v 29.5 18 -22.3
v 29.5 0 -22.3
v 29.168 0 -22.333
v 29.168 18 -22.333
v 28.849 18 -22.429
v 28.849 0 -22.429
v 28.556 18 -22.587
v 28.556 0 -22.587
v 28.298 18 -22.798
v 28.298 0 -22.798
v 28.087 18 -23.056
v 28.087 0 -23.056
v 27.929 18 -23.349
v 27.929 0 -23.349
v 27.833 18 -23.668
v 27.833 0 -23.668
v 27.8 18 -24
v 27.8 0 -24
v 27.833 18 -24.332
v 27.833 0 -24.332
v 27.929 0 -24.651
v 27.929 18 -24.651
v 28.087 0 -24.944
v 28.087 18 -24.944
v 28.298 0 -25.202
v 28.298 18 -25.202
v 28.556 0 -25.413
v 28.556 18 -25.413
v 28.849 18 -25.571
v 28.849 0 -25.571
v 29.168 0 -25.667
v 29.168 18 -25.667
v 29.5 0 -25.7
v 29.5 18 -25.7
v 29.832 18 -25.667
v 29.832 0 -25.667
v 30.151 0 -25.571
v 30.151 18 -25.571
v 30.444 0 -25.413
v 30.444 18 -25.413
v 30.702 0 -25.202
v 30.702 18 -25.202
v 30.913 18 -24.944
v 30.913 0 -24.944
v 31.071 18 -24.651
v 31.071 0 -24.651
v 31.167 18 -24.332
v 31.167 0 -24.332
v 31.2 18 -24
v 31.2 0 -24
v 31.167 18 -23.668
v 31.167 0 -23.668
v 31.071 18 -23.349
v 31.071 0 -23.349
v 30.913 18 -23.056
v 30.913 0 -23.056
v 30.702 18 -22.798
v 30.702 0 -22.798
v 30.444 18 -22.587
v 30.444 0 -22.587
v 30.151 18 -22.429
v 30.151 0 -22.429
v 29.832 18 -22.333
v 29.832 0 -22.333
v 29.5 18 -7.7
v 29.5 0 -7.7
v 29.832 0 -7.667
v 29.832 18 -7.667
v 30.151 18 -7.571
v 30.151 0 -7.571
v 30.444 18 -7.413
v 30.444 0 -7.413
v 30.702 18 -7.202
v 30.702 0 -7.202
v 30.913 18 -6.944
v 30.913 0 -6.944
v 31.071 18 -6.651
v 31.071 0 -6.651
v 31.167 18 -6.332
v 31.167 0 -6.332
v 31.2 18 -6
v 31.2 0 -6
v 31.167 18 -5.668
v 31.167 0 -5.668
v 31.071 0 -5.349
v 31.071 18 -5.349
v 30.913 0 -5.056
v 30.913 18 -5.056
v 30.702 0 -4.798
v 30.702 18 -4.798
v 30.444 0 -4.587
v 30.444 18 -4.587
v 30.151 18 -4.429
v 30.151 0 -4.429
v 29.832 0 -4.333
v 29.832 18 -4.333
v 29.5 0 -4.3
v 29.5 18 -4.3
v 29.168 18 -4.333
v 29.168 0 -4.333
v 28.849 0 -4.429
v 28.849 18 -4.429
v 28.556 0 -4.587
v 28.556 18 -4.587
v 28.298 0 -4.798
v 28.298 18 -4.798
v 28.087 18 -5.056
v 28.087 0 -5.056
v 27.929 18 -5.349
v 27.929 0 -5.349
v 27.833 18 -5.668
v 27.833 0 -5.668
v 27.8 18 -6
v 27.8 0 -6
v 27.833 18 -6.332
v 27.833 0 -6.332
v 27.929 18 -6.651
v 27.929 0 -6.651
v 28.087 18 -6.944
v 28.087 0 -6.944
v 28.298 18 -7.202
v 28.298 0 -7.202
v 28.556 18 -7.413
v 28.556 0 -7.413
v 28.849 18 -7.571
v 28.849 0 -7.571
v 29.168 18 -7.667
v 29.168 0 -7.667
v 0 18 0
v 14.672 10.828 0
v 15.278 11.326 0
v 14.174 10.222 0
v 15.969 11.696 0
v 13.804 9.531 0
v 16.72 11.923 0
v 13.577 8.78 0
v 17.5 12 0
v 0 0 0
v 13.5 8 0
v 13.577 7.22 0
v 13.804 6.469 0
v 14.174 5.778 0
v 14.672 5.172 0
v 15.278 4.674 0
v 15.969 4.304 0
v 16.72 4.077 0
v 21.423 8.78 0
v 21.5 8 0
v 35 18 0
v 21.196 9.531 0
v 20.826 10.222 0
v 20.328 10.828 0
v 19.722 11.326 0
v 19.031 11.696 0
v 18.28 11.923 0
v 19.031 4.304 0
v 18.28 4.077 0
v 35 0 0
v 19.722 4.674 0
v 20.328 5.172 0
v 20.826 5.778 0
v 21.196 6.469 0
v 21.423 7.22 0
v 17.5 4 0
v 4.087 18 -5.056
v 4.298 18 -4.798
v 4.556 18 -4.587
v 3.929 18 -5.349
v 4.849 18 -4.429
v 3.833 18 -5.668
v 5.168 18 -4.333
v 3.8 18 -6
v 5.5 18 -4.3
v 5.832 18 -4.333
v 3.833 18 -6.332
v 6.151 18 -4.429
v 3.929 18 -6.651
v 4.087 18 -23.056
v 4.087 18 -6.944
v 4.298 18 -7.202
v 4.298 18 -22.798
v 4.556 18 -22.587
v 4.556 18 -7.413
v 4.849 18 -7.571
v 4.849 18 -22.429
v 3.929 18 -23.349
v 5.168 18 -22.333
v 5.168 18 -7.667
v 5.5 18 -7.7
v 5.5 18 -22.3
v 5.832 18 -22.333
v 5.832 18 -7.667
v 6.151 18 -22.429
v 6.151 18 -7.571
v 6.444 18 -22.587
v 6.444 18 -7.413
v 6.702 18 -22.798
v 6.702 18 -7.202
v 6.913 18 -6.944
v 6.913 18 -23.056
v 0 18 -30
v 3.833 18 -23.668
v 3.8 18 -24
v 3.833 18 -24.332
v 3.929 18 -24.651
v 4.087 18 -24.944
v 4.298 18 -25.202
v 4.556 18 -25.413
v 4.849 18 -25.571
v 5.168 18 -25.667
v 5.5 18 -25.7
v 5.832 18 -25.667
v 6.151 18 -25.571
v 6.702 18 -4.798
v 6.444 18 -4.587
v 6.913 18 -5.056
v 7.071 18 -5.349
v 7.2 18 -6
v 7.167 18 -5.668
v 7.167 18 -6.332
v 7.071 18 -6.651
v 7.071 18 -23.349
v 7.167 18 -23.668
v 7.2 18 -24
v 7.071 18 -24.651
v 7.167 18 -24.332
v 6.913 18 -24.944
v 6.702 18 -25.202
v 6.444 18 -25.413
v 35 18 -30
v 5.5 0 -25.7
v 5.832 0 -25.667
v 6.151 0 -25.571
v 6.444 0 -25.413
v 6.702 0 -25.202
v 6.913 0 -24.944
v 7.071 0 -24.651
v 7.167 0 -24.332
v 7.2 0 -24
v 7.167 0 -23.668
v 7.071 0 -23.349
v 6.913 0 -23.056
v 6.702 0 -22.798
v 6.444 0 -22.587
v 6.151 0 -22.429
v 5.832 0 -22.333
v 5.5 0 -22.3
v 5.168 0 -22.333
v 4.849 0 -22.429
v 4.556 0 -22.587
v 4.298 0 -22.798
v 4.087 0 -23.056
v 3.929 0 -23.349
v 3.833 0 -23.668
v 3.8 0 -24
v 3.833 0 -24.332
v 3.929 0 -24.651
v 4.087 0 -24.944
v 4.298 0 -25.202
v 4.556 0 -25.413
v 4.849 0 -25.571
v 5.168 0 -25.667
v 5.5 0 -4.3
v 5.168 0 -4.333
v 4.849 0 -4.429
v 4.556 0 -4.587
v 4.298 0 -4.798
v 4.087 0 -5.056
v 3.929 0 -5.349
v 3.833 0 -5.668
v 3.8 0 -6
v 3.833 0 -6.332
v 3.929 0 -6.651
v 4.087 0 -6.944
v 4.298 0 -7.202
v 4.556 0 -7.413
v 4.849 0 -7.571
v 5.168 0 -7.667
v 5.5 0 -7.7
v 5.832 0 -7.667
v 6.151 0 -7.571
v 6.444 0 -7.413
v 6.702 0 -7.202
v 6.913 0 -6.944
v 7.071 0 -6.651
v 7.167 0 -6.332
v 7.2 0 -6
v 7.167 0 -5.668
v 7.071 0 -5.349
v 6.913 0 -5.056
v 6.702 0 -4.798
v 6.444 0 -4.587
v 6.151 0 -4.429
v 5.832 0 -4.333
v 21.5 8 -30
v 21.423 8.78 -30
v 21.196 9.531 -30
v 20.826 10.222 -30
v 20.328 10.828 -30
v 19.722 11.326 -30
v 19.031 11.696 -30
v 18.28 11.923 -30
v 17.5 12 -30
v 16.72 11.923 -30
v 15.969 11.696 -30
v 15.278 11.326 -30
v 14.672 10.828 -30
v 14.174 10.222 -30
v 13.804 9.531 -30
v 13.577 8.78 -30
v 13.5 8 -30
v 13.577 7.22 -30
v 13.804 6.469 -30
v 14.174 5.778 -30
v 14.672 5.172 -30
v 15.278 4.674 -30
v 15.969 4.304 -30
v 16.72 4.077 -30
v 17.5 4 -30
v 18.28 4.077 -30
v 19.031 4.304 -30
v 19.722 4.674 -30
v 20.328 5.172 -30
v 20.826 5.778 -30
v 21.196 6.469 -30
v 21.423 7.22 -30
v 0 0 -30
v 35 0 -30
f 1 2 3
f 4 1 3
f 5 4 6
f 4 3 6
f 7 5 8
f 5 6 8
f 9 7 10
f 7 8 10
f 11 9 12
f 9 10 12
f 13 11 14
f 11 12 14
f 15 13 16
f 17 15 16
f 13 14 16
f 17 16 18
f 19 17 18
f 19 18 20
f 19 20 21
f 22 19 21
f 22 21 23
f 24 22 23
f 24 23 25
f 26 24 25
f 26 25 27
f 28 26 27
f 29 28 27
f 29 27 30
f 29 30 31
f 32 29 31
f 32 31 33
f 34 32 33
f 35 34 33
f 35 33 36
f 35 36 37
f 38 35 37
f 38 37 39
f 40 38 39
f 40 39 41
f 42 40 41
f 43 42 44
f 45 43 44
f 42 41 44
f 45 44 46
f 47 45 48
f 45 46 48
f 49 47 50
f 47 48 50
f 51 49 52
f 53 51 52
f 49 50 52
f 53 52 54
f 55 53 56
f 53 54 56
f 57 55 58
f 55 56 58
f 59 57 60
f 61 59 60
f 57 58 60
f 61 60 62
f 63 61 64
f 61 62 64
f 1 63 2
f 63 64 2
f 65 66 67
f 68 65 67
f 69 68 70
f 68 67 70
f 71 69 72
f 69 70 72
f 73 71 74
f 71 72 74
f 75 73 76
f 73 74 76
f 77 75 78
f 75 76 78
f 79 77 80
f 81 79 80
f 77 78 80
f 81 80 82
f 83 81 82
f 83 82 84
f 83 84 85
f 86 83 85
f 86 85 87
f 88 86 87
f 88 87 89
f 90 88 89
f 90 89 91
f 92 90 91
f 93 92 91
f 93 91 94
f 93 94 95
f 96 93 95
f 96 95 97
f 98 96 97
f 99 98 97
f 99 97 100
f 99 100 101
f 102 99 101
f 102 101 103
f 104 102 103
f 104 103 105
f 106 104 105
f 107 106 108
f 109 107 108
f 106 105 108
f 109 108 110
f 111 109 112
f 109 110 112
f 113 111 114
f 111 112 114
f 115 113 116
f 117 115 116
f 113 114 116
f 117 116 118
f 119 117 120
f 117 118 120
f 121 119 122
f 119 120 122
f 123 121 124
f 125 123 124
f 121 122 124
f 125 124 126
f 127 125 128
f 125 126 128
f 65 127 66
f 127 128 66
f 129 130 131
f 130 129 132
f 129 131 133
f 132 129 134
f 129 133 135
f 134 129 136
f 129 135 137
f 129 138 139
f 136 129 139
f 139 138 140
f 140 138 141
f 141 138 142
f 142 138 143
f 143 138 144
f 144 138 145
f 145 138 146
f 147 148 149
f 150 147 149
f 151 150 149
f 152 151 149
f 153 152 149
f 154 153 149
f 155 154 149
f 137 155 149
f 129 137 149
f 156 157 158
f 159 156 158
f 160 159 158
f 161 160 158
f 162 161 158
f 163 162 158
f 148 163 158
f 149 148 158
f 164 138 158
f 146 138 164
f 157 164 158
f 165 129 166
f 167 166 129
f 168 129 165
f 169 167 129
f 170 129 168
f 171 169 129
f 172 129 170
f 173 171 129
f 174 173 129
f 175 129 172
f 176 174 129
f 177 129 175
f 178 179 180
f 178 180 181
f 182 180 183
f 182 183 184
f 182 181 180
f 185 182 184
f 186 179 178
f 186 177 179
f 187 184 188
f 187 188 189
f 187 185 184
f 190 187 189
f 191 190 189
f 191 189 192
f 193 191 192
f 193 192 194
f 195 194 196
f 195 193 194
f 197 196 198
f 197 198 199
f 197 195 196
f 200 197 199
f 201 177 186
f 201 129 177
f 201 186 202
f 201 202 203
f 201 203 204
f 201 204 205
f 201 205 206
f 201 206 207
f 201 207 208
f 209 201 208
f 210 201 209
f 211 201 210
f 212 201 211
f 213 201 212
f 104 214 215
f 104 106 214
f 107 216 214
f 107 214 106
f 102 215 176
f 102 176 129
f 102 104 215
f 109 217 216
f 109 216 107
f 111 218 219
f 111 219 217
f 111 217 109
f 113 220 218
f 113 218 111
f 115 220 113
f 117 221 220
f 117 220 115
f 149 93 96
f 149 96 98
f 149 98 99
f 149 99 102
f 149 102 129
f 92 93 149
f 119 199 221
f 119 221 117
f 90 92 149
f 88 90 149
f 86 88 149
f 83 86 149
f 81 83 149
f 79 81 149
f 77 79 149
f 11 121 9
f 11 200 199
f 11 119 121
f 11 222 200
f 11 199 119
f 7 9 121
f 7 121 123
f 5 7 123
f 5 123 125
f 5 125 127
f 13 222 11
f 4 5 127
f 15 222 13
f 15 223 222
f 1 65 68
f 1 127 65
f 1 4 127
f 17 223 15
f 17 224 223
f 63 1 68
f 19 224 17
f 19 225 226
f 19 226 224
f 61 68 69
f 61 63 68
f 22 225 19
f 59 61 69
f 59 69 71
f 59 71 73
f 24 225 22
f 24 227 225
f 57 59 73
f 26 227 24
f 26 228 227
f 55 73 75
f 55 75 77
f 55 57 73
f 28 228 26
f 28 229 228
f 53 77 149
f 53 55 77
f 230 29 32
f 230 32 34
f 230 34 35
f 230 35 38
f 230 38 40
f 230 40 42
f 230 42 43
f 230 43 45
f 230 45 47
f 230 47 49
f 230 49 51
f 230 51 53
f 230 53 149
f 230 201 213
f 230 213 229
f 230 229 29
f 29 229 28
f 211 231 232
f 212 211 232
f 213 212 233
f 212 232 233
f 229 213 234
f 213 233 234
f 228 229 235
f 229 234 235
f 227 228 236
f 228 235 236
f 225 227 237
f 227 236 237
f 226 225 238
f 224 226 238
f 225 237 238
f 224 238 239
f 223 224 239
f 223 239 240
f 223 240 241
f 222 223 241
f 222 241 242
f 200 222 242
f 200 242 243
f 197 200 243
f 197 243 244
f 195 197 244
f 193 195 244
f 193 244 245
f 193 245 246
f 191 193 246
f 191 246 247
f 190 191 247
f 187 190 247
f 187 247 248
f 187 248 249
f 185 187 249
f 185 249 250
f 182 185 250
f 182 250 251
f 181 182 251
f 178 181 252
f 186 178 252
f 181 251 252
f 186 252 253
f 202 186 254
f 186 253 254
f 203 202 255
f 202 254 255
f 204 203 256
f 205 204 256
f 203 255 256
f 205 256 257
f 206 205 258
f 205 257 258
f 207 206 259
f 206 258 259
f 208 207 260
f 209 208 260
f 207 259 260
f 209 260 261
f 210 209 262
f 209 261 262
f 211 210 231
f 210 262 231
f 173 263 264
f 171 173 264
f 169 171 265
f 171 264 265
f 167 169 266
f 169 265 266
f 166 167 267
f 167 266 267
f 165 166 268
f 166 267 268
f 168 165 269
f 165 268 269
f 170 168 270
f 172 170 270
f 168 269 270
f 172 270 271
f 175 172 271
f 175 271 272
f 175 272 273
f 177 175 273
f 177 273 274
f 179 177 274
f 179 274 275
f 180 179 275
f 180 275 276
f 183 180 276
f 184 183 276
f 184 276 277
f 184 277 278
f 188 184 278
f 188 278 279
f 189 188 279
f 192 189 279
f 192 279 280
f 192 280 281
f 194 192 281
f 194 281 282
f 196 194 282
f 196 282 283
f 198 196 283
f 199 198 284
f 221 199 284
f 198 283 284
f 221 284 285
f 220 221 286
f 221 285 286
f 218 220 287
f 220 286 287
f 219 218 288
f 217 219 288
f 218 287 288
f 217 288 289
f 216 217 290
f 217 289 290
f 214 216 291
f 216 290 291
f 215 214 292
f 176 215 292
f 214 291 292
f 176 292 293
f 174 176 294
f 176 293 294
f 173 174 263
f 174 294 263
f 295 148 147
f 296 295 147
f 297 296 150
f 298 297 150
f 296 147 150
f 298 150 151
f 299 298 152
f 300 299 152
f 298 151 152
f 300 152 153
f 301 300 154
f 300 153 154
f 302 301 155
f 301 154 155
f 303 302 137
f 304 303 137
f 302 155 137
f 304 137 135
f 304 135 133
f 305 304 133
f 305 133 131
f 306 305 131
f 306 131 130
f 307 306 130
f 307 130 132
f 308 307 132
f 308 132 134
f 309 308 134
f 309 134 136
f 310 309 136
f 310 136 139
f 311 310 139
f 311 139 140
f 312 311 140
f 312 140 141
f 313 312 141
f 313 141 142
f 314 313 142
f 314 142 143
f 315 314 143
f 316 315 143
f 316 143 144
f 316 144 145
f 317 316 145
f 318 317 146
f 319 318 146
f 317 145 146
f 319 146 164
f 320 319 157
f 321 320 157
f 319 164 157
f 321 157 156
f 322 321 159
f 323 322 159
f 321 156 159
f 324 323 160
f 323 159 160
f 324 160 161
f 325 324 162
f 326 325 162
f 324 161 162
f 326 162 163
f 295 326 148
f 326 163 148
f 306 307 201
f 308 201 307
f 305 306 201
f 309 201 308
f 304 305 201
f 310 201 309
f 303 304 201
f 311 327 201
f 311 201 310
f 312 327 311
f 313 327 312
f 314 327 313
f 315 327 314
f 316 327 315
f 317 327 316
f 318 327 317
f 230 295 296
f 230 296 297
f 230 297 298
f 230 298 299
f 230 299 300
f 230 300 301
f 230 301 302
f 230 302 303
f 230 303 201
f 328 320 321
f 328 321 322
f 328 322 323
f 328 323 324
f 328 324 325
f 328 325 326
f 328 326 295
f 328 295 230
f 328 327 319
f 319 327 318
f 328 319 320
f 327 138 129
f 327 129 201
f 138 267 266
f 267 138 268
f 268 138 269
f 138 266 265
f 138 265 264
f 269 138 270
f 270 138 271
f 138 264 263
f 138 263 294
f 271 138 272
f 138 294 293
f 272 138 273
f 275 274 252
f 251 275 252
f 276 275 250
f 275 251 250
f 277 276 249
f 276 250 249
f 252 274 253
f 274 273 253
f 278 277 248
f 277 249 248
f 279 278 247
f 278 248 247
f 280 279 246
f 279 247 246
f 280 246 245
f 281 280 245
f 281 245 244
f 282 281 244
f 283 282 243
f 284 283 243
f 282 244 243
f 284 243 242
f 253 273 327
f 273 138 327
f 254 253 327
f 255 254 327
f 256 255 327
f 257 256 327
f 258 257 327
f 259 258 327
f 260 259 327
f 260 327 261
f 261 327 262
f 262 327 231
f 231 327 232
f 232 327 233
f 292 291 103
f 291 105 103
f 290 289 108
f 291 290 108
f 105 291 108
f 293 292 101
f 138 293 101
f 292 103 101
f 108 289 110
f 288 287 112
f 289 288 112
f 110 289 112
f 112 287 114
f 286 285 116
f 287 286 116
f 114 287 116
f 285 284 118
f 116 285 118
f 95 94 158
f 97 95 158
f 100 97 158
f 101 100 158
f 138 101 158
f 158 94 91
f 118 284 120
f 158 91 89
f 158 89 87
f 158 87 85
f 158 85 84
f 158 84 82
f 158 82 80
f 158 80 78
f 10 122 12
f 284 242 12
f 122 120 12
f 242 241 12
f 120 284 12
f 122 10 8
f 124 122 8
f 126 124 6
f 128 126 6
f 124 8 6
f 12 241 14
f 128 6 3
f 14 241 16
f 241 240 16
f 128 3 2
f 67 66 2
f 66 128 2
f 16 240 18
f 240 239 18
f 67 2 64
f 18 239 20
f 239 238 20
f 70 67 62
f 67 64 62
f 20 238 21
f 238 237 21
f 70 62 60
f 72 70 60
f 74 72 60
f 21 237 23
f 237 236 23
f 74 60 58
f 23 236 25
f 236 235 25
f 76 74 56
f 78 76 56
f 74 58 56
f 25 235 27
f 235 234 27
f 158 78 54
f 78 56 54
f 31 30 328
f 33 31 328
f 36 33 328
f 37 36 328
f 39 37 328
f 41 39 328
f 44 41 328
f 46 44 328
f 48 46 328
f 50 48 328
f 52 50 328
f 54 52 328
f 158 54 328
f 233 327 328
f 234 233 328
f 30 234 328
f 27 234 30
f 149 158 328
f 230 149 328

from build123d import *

# Parameters (mm, degrees)
SKETCH2_W           = 35
SKETCH2_H           = 30
BOSS_EXTRUDE1_DEPTH = 18
SKETCH3_R           = 1.7
CUT_EXTRUDE1_DEPTH  = 50.487372127
SKETCH4_R           = 4
CUT_EXTRUDE2_DEPTH  = 50.487372127


with BuildPart() as part:
    # Sketch2 → Boss-Extrude1 (new body)
    with BuildSketch(Plane(origin=(0, 0, 0), x_dir=(1, 0, 0), z_dir=(0, 1, 0))):
        with Locations((17.5, 15)):
            Rectangle(SKETCH2_W, SKETCH2_H)
    extrude(amount=BOSS_EXTRUDE1_DEPTH)

    # Sketch3 → Cut-Extrude1 (cut, through all)
    with BuildSketch(Plane.XZ):
        with Locations(Location((5.5, -24, 0), (0, 0, 270))):
            Circle(SKETCH3_R)
        with Locations(Location((29.5, -24, 0), (0, 0, 90))):
            Circle(SKETCH3_R)
        with Locations(Location((29.5, -6, 0), (0, 0, 270))):
            Circle(SKETCH3_R)
        with Locations(Location((5.5, -6, 0), (0, 0, 90))):
            Circle(SKETCH3_R)
    extrude(amount=-CUT_EXTRUDE1_DEPTH, mode=Mode.SUBTRACT)

    # Sketch4 → Cut-Extrude2 (cut, through all)
    with BuildSketch(Plane.XY):
        with Locations((17.5, 8)):
            Circle(SKETCH4_R)
    extrude(amount=-CUT_EXTRUDE2_DEPTH, mode=Mode.SUBTRACT)


solid = part.part
